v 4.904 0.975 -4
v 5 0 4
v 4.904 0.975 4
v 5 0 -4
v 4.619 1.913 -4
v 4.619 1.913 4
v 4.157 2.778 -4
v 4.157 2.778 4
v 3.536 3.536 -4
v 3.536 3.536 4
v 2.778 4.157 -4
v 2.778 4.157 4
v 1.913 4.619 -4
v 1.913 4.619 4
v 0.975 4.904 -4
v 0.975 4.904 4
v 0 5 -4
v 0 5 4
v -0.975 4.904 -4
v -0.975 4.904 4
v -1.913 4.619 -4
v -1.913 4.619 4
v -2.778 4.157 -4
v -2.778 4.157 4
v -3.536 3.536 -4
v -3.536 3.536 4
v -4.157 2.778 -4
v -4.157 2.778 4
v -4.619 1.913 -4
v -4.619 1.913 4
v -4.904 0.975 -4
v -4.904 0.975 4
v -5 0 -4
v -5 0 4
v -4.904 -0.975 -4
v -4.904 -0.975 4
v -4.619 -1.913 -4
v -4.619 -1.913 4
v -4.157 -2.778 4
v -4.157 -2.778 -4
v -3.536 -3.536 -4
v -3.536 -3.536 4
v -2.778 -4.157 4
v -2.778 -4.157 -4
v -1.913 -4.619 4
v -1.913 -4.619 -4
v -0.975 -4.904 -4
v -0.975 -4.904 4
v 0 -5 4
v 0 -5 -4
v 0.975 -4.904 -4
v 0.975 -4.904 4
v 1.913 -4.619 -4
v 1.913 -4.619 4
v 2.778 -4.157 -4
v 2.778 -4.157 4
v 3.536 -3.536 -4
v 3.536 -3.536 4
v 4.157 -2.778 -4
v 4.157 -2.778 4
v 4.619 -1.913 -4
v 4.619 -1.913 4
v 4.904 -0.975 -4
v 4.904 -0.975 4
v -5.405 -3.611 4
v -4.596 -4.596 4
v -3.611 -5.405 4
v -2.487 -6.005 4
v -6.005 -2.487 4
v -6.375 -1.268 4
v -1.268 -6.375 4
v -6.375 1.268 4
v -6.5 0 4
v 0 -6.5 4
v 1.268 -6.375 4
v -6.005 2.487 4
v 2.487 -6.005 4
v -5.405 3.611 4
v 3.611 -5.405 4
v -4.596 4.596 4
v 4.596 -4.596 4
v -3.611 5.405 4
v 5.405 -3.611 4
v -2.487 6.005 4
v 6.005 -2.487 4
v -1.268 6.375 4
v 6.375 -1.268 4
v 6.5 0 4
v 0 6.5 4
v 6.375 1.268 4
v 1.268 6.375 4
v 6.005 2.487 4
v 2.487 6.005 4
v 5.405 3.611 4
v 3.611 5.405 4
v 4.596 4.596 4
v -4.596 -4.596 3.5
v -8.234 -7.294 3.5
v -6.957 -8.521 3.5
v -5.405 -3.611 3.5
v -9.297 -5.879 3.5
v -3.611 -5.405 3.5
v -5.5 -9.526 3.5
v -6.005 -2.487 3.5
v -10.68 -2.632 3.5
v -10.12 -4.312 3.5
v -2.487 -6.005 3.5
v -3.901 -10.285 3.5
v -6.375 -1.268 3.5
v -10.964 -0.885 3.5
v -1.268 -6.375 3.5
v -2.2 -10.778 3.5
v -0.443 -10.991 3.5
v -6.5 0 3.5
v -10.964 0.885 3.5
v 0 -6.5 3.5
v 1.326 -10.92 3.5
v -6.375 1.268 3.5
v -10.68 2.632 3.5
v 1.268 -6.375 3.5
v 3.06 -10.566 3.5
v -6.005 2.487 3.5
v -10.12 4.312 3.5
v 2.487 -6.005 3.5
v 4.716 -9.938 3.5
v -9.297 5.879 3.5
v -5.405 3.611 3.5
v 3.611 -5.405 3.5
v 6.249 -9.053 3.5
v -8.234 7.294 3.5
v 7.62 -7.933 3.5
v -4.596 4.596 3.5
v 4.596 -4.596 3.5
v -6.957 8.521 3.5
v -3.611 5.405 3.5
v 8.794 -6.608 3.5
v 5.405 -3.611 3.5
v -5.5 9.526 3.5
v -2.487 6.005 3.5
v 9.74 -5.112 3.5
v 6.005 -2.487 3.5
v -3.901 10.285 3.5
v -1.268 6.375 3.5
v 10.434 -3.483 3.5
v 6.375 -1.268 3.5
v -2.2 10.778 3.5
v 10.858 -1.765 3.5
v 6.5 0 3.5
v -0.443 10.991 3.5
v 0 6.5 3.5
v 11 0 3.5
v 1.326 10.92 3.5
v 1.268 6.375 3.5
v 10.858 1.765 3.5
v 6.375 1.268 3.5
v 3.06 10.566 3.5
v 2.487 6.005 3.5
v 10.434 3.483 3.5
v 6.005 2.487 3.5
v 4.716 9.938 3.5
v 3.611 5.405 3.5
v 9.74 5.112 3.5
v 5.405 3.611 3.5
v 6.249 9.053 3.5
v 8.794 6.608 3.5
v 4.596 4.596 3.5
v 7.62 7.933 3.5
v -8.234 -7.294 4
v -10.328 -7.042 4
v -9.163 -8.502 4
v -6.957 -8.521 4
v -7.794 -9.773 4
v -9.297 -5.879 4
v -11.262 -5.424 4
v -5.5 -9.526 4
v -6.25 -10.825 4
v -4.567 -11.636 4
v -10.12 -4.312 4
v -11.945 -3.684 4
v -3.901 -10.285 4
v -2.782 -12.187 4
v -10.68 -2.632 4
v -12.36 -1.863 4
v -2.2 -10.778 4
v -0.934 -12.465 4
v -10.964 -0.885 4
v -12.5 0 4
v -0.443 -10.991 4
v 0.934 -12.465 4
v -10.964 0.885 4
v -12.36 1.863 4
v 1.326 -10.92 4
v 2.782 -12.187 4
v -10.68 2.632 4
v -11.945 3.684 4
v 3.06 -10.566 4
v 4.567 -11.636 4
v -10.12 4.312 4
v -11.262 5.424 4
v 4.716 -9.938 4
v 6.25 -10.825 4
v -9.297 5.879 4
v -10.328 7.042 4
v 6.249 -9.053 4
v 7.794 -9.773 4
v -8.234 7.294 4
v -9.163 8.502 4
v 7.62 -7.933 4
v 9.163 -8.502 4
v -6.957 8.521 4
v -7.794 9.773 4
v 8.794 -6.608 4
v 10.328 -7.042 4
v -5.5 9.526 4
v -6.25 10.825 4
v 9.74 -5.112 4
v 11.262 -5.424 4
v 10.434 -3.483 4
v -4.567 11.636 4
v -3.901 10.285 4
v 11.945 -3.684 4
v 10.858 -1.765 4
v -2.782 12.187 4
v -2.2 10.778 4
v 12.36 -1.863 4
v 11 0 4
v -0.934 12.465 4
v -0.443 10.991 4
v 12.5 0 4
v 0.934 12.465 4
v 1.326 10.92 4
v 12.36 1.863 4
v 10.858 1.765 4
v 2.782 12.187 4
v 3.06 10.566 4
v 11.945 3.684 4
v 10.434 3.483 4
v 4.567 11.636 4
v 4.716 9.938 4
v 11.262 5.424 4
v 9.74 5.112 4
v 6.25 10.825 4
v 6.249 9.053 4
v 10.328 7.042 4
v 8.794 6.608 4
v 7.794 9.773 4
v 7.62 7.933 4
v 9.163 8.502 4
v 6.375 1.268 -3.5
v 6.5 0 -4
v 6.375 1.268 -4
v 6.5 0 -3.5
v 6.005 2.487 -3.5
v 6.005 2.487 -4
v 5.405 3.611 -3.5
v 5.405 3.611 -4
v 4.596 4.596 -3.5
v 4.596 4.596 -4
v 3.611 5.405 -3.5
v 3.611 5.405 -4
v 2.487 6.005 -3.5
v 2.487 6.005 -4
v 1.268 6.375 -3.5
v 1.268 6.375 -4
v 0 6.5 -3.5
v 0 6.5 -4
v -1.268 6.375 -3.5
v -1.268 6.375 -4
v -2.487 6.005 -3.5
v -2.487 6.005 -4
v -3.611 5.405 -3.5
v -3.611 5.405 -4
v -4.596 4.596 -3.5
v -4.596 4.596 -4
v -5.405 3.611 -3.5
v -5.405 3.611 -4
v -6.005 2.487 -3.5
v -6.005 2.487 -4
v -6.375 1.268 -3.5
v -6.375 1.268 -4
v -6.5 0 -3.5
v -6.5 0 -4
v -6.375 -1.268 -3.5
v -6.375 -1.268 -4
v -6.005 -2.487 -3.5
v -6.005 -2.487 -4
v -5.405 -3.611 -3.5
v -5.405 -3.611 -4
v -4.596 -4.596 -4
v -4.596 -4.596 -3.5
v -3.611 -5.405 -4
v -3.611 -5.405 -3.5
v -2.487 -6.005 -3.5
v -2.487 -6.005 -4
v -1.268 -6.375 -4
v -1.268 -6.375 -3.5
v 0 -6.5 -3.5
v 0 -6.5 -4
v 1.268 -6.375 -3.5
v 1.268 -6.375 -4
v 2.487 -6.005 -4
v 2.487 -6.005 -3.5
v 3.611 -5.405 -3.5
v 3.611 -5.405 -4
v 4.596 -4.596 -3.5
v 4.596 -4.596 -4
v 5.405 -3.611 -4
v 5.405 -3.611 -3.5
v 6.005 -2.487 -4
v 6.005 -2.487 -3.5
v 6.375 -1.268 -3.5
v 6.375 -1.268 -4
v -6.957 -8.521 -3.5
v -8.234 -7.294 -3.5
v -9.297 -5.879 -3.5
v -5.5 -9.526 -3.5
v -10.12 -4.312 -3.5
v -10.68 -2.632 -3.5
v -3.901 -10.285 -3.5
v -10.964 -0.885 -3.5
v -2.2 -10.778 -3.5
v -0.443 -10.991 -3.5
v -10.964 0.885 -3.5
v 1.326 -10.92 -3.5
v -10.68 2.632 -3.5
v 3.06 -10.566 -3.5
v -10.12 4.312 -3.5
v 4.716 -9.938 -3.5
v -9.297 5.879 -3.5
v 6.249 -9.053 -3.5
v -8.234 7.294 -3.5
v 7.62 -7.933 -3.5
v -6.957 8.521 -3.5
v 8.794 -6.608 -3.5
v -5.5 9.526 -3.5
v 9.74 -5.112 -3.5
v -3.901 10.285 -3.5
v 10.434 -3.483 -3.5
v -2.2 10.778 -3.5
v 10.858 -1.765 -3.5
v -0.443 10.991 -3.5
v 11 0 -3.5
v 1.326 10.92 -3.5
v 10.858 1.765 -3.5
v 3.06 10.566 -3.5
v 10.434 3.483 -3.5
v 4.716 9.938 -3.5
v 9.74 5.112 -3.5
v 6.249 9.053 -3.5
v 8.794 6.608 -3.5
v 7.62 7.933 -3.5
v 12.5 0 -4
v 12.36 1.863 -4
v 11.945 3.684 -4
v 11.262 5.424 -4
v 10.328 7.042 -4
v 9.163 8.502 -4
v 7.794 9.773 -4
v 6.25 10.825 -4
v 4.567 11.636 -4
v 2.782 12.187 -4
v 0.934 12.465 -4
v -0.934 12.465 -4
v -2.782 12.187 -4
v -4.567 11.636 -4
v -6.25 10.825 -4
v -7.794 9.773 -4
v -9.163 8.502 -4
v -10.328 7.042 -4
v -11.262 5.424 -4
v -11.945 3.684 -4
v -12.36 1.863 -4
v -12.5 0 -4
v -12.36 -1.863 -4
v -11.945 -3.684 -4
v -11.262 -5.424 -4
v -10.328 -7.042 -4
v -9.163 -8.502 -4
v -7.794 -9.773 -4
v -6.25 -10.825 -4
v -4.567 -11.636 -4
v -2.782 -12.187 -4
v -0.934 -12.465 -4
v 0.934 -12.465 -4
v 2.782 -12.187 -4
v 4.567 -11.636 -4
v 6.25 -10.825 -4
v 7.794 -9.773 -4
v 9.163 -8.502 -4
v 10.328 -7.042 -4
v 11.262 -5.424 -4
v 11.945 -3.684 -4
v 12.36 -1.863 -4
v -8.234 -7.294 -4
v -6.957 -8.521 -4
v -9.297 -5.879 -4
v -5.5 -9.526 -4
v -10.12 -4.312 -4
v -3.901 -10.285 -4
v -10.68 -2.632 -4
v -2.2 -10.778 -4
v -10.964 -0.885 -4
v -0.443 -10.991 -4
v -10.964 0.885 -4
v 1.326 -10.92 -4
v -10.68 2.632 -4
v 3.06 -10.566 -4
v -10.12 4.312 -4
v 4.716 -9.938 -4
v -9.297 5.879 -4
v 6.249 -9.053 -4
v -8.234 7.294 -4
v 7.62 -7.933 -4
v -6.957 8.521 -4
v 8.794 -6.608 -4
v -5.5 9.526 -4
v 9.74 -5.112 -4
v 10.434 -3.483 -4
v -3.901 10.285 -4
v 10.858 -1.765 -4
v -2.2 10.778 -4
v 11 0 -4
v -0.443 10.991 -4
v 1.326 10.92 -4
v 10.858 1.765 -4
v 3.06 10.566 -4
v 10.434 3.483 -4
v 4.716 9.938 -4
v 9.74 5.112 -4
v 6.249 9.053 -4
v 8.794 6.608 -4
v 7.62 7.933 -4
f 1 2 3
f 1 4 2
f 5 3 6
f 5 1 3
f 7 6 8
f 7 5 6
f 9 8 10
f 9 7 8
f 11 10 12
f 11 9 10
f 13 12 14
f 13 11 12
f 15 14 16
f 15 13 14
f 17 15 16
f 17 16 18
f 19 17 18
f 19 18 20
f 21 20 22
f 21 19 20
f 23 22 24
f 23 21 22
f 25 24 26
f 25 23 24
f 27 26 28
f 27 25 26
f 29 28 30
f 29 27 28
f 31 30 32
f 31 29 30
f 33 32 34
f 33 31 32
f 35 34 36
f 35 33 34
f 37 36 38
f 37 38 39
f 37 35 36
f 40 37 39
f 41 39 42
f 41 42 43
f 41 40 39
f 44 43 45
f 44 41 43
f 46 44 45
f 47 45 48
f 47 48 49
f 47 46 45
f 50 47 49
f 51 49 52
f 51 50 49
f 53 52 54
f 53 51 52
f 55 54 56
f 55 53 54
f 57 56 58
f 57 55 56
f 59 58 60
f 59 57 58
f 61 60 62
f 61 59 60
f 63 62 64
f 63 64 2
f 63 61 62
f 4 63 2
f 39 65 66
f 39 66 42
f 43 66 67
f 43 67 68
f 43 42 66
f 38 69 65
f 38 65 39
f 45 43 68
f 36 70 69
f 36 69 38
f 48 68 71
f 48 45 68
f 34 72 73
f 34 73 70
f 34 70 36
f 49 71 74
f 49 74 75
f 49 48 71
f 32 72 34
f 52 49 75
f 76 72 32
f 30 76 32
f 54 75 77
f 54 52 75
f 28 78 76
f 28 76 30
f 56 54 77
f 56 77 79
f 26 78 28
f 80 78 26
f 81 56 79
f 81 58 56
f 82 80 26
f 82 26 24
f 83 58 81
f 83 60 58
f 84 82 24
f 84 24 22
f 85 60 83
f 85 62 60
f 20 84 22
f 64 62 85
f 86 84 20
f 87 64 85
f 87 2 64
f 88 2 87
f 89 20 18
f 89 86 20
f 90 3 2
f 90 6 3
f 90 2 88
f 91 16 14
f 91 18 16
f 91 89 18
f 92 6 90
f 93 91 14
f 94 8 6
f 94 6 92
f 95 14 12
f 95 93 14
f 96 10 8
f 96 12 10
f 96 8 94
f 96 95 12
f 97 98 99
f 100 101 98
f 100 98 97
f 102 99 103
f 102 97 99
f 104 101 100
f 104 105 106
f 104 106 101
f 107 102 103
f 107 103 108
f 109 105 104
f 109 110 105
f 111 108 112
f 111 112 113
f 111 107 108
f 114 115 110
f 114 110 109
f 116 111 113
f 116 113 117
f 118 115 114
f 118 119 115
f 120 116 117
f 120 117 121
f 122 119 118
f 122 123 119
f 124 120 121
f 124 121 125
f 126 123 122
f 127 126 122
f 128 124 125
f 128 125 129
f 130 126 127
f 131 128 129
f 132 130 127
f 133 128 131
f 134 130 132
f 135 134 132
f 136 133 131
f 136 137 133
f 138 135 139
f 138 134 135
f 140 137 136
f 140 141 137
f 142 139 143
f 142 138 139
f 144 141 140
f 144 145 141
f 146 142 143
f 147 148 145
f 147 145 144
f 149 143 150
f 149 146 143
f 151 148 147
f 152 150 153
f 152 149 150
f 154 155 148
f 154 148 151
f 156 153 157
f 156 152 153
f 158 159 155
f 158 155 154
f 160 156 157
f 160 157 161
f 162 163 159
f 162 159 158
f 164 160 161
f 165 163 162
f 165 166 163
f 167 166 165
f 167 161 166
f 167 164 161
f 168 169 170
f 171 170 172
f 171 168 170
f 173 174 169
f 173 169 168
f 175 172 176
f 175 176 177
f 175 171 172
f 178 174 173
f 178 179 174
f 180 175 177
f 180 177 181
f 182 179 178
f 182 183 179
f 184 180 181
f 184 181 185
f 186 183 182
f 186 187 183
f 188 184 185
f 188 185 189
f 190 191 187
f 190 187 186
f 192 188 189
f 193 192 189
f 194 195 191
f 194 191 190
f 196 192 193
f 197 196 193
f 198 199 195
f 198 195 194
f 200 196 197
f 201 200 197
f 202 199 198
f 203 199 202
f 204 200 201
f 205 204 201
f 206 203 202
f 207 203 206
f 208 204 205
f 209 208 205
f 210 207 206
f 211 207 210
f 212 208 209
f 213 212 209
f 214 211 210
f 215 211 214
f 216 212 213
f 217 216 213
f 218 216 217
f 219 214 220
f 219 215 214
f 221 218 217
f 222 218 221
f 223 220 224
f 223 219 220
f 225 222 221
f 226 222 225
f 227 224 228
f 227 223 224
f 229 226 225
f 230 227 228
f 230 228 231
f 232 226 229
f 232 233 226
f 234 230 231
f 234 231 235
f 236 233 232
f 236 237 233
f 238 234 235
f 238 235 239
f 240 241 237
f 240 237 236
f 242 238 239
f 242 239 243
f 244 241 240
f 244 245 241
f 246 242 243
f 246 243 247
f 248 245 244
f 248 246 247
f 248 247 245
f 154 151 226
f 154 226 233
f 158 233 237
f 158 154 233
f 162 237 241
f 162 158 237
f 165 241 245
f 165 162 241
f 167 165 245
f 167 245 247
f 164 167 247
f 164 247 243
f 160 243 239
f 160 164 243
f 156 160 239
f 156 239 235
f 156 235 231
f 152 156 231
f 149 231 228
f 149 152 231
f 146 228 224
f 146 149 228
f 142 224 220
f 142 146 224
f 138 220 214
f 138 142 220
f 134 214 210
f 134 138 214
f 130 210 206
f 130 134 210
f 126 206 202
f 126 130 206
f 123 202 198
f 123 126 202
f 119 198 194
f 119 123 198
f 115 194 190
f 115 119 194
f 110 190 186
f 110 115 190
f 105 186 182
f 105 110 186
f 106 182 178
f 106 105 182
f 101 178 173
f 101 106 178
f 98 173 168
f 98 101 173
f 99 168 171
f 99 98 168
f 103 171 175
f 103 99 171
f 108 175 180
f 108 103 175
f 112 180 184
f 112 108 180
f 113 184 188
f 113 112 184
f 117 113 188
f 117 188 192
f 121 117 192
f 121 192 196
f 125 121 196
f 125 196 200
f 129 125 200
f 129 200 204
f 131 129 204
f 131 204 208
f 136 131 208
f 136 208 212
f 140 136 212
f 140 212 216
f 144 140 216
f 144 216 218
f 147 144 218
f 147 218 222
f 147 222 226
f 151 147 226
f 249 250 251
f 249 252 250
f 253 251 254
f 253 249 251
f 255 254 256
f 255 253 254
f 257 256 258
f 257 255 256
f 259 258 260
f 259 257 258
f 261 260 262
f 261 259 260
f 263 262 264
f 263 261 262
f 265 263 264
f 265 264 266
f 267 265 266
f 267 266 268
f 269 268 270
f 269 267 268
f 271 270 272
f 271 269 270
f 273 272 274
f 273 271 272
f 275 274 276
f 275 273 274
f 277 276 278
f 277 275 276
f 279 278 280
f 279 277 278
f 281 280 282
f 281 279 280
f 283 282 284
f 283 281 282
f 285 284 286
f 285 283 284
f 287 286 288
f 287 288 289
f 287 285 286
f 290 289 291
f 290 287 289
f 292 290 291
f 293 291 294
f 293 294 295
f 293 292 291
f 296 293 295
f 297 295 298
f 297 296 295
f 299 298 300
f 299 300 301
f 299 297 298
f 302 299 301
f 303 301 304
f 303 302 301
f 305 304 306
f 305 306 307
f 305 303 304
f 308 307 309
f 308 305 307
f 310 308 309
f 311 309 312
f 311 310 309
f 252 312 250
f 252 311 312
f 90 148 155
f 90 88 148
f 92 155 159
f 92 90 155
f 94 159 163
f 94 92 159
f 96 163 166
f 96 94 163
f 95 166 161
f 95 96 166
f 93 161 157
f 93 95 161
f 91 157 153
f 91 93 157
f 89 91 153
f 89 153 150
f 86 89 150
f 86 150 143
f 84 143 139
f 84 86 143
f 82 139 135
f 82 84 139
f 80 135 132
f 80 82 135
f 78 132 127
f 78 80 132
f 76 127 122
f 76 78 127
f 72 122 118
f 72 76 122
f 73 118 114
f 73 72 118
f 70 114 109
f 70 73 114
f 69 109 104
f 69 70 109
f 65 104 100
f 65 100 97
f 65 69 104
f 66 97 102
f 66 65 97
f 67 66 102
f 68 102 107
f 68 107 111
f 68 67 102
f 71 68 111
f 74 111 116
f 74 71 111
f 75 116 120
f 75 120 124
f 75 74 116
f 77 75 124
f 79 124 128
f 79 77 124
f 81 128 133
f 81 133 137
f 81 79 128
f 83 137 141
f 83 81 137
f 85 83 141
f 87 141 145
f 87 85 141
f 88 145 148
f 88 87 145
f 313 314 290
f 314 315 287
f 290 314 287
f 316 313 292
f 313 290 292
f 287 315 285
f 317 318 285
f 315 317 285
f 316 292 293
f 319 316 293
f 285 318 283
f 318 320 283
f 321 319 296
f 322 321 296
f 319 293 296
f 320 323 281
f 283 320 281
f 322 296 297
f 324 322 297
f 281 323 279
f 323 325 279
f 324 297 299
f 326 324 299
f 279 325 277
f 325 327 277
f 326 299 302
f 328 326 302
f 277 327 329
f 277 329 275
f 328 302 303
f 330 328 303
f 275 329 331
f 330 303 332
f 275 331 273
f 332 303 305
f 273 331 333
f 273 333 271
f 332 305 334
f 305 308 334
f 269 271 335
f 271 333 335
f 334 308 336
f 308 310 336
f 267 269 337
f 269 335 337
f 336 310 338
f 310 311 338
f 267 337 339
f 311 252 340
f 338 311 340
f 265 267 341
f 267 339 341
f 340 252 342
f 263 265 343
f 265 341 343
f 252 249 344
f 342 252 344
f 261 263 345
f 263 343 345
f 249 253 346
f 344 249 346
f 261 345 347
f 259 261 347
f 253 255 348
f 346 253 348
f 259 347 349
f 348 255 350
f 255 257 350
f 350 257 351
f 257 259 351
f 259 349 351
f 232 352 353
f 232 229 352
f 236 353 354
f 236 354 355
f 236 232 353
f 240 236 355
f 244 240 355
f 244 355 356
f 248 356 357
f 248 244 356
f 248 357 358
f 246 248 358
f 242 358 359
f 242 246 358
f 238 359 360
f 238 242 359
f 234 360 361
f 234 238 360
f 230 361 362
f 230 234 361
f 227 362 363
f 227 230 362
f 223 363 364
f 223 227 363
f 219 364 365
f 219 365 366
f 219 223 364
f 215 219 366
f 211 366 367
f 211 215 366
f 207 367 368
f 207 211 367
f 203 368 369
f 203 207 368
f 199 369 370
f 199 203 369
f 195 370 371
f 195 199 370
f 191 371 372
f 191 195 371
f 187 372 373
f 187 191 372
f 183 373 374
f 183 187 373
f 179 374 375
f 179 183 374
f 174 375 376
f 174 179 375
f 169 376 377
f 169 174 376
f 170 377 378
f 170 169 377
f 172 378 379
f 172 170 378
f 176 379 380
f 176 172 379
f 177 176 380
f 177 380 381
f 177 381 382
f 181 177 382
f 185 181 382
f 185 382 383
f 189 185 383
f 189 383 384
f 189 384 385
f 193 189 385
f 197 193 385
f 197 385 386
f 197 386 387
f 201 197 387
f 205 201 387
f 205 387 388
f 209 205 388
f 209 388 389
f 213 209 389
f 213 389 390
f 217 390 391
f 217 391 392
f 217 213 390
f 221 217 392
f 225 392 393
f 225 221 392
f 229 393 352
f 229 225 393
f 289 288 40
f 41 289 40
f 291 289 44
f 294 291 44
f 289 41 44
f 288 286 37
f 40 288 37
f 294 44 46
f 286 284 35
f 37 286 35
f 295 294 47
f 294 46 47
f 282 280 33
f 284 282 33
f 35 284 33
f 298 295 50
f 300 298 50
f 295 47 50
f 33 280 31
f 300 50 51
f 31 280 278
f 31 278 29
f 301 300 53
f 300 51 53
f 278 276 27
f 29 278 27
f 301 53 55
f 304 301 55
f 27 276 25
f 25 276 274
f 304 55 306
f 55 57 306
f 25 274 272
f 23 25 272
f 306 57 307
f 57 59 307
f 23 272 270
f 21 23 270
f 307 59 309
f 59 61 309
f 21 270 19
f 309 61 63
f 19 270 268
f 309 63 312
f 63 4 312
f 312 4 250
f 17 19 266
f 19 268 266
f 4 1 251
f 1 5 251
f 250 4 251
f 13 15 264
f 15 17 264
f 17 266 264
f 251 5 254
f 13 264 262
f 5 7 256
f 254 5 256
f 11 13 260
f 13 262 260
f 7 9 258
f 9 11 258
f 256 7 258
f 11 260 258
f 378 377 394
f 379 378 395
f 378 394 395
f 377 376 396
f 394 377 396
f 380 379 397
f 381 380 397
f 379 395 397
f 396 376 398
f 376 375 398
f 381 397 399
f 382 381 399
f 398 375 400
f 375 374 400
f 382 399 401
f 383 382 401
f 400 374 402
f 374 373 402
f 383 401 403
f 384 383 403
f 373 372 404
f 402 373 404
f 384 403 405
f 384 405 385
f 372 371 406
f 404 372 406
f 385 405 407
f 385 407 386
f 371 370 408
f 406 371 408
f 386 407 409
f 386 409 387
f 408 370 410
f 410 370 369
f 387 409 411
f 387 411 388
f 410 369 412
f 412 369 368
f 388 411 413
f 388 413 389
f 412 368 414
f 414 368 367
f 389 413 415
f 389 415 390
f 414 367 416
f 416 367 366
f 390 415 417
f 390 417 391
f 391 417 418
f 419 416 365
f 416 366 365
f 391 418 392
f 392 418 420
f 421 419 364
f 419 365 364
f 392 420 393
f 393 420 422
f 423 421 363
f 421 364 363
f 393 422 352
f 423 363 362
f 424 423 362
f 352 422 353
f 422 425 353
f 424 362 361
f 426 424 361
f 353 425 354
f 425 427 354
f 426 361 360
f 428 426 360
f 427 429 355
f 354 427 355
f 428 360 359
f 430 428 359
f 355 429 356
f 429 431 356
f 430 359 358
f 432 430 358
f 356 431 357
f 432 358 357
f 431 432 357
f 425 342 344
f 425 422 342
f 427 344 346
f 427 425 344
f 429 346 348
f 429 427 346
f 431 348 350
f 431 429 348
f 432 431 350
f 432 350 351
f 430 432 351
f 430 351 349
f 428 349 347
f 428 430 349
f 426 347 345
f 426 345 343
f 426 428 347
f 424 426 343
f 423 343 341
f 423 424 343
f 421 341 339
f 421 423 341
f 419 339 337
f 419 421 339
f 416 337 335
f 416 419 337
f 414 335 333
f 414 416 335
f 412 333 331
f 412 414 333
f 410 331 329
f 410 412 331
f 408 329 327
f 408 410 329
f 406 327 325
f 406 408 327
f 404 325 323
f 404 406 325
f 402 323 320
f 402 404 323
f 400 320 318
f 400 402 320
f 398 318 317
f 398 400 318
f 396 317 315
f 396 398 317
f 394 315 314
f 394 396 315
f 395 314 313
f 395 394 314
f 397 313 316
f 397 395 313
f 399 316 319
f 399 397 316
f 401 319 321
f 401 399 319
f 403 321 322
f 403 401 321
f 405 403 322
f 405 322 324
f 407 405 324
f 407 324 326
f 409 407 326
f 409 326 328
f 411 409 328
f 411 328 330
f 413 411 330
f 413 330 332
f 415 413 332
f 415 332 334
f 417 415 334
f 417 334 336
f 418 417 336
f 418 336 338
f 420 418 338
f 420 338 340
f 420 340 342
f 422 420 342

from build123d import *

# Parameters (mm, degrees)
SALIENTE_EXTRUIR1_DEPTH        = 4
SALIENTE_EXTRUIR1_DEPTH_BACK   = 4
CROQUIS1_R                     = 12.5
CROQUIS1_R_2                   = 11
SALIENTE_EXTRUIR1_2_DEPTH      = 4
SALIENTE_EXTRUIR1_2_DEPTH_BACK = 4
CROQUIS1_R_3                   = 6.5
CROQUIS1_R_4                   = 5
SALIENTE_EXTRUIR2_DEPTH        = 3.5
SALIENTE_EXTRUIR2_DEPTH_BACK   = 3.5
CROQUIS1_4_R                   = 11
CROQUIS1_4_R_2                 = 6.5


with BuildPart() as part:
    # Croquis1 → Saliente-Extruir1 (new, two sides: drawn at the far end of the back side and taken through both)
    with BuildSketch(Plane.XY.offset(-SALIENTE_EXTRUIR1_DEPTH_BACK)):
        Circle(CROQUIS1_R)
        Circle(CROQUIS1_R_2, mode=Mode.SUBTRACT)
    extrude(amount=SALIENTE_EXTRUIR1_DEPTH + SALIENTE_EXTRUIR1_DEPTH_BACK)



with BuildPart() as body_2:
    # Croquis1 → Saliente-Extruir1 2 (new, two sides: drawn at the far end of the back side and taken through both)
    with BuildSketch(Plane.XY.offset(-SALIENTE_EXTRUIR1_2_DEPTH_BACK)):
        Circle(CROQUIS1_R_3)
        Circle(CROQUIS1_R_4, mode=Mode.SUBTRACT)
    extrude(amount=SALIENTE_EXTRUIR1_2_DEPTH + SALIENTE_EXTRUIR1_2_DEPTH_BACK)


with BuildPart() as part_1:
    add(part.part)

    add(body_2.part)  # Saliente-Extruir2 merges body 2
    # Croquis1<4> → Saliente-Extruir2 (add, two sides: drawn at the far end of the back side and taken through both)
    with BuildSketch(Plane.XY.offset(-SALIENTE_EXTRUIR2_DEPTH_BACK)):
        Circle(CROQUIS1_4_R)
        Circle(CROQUIS1_4_R_2, mode=Mode.SUBTRACT)
    extrude(amount=SALIENTE_EXTRUIR2_DEPTH + SALIENTE_EXTRUIR2_DEPTH_BACK)


solid = part_1.part
